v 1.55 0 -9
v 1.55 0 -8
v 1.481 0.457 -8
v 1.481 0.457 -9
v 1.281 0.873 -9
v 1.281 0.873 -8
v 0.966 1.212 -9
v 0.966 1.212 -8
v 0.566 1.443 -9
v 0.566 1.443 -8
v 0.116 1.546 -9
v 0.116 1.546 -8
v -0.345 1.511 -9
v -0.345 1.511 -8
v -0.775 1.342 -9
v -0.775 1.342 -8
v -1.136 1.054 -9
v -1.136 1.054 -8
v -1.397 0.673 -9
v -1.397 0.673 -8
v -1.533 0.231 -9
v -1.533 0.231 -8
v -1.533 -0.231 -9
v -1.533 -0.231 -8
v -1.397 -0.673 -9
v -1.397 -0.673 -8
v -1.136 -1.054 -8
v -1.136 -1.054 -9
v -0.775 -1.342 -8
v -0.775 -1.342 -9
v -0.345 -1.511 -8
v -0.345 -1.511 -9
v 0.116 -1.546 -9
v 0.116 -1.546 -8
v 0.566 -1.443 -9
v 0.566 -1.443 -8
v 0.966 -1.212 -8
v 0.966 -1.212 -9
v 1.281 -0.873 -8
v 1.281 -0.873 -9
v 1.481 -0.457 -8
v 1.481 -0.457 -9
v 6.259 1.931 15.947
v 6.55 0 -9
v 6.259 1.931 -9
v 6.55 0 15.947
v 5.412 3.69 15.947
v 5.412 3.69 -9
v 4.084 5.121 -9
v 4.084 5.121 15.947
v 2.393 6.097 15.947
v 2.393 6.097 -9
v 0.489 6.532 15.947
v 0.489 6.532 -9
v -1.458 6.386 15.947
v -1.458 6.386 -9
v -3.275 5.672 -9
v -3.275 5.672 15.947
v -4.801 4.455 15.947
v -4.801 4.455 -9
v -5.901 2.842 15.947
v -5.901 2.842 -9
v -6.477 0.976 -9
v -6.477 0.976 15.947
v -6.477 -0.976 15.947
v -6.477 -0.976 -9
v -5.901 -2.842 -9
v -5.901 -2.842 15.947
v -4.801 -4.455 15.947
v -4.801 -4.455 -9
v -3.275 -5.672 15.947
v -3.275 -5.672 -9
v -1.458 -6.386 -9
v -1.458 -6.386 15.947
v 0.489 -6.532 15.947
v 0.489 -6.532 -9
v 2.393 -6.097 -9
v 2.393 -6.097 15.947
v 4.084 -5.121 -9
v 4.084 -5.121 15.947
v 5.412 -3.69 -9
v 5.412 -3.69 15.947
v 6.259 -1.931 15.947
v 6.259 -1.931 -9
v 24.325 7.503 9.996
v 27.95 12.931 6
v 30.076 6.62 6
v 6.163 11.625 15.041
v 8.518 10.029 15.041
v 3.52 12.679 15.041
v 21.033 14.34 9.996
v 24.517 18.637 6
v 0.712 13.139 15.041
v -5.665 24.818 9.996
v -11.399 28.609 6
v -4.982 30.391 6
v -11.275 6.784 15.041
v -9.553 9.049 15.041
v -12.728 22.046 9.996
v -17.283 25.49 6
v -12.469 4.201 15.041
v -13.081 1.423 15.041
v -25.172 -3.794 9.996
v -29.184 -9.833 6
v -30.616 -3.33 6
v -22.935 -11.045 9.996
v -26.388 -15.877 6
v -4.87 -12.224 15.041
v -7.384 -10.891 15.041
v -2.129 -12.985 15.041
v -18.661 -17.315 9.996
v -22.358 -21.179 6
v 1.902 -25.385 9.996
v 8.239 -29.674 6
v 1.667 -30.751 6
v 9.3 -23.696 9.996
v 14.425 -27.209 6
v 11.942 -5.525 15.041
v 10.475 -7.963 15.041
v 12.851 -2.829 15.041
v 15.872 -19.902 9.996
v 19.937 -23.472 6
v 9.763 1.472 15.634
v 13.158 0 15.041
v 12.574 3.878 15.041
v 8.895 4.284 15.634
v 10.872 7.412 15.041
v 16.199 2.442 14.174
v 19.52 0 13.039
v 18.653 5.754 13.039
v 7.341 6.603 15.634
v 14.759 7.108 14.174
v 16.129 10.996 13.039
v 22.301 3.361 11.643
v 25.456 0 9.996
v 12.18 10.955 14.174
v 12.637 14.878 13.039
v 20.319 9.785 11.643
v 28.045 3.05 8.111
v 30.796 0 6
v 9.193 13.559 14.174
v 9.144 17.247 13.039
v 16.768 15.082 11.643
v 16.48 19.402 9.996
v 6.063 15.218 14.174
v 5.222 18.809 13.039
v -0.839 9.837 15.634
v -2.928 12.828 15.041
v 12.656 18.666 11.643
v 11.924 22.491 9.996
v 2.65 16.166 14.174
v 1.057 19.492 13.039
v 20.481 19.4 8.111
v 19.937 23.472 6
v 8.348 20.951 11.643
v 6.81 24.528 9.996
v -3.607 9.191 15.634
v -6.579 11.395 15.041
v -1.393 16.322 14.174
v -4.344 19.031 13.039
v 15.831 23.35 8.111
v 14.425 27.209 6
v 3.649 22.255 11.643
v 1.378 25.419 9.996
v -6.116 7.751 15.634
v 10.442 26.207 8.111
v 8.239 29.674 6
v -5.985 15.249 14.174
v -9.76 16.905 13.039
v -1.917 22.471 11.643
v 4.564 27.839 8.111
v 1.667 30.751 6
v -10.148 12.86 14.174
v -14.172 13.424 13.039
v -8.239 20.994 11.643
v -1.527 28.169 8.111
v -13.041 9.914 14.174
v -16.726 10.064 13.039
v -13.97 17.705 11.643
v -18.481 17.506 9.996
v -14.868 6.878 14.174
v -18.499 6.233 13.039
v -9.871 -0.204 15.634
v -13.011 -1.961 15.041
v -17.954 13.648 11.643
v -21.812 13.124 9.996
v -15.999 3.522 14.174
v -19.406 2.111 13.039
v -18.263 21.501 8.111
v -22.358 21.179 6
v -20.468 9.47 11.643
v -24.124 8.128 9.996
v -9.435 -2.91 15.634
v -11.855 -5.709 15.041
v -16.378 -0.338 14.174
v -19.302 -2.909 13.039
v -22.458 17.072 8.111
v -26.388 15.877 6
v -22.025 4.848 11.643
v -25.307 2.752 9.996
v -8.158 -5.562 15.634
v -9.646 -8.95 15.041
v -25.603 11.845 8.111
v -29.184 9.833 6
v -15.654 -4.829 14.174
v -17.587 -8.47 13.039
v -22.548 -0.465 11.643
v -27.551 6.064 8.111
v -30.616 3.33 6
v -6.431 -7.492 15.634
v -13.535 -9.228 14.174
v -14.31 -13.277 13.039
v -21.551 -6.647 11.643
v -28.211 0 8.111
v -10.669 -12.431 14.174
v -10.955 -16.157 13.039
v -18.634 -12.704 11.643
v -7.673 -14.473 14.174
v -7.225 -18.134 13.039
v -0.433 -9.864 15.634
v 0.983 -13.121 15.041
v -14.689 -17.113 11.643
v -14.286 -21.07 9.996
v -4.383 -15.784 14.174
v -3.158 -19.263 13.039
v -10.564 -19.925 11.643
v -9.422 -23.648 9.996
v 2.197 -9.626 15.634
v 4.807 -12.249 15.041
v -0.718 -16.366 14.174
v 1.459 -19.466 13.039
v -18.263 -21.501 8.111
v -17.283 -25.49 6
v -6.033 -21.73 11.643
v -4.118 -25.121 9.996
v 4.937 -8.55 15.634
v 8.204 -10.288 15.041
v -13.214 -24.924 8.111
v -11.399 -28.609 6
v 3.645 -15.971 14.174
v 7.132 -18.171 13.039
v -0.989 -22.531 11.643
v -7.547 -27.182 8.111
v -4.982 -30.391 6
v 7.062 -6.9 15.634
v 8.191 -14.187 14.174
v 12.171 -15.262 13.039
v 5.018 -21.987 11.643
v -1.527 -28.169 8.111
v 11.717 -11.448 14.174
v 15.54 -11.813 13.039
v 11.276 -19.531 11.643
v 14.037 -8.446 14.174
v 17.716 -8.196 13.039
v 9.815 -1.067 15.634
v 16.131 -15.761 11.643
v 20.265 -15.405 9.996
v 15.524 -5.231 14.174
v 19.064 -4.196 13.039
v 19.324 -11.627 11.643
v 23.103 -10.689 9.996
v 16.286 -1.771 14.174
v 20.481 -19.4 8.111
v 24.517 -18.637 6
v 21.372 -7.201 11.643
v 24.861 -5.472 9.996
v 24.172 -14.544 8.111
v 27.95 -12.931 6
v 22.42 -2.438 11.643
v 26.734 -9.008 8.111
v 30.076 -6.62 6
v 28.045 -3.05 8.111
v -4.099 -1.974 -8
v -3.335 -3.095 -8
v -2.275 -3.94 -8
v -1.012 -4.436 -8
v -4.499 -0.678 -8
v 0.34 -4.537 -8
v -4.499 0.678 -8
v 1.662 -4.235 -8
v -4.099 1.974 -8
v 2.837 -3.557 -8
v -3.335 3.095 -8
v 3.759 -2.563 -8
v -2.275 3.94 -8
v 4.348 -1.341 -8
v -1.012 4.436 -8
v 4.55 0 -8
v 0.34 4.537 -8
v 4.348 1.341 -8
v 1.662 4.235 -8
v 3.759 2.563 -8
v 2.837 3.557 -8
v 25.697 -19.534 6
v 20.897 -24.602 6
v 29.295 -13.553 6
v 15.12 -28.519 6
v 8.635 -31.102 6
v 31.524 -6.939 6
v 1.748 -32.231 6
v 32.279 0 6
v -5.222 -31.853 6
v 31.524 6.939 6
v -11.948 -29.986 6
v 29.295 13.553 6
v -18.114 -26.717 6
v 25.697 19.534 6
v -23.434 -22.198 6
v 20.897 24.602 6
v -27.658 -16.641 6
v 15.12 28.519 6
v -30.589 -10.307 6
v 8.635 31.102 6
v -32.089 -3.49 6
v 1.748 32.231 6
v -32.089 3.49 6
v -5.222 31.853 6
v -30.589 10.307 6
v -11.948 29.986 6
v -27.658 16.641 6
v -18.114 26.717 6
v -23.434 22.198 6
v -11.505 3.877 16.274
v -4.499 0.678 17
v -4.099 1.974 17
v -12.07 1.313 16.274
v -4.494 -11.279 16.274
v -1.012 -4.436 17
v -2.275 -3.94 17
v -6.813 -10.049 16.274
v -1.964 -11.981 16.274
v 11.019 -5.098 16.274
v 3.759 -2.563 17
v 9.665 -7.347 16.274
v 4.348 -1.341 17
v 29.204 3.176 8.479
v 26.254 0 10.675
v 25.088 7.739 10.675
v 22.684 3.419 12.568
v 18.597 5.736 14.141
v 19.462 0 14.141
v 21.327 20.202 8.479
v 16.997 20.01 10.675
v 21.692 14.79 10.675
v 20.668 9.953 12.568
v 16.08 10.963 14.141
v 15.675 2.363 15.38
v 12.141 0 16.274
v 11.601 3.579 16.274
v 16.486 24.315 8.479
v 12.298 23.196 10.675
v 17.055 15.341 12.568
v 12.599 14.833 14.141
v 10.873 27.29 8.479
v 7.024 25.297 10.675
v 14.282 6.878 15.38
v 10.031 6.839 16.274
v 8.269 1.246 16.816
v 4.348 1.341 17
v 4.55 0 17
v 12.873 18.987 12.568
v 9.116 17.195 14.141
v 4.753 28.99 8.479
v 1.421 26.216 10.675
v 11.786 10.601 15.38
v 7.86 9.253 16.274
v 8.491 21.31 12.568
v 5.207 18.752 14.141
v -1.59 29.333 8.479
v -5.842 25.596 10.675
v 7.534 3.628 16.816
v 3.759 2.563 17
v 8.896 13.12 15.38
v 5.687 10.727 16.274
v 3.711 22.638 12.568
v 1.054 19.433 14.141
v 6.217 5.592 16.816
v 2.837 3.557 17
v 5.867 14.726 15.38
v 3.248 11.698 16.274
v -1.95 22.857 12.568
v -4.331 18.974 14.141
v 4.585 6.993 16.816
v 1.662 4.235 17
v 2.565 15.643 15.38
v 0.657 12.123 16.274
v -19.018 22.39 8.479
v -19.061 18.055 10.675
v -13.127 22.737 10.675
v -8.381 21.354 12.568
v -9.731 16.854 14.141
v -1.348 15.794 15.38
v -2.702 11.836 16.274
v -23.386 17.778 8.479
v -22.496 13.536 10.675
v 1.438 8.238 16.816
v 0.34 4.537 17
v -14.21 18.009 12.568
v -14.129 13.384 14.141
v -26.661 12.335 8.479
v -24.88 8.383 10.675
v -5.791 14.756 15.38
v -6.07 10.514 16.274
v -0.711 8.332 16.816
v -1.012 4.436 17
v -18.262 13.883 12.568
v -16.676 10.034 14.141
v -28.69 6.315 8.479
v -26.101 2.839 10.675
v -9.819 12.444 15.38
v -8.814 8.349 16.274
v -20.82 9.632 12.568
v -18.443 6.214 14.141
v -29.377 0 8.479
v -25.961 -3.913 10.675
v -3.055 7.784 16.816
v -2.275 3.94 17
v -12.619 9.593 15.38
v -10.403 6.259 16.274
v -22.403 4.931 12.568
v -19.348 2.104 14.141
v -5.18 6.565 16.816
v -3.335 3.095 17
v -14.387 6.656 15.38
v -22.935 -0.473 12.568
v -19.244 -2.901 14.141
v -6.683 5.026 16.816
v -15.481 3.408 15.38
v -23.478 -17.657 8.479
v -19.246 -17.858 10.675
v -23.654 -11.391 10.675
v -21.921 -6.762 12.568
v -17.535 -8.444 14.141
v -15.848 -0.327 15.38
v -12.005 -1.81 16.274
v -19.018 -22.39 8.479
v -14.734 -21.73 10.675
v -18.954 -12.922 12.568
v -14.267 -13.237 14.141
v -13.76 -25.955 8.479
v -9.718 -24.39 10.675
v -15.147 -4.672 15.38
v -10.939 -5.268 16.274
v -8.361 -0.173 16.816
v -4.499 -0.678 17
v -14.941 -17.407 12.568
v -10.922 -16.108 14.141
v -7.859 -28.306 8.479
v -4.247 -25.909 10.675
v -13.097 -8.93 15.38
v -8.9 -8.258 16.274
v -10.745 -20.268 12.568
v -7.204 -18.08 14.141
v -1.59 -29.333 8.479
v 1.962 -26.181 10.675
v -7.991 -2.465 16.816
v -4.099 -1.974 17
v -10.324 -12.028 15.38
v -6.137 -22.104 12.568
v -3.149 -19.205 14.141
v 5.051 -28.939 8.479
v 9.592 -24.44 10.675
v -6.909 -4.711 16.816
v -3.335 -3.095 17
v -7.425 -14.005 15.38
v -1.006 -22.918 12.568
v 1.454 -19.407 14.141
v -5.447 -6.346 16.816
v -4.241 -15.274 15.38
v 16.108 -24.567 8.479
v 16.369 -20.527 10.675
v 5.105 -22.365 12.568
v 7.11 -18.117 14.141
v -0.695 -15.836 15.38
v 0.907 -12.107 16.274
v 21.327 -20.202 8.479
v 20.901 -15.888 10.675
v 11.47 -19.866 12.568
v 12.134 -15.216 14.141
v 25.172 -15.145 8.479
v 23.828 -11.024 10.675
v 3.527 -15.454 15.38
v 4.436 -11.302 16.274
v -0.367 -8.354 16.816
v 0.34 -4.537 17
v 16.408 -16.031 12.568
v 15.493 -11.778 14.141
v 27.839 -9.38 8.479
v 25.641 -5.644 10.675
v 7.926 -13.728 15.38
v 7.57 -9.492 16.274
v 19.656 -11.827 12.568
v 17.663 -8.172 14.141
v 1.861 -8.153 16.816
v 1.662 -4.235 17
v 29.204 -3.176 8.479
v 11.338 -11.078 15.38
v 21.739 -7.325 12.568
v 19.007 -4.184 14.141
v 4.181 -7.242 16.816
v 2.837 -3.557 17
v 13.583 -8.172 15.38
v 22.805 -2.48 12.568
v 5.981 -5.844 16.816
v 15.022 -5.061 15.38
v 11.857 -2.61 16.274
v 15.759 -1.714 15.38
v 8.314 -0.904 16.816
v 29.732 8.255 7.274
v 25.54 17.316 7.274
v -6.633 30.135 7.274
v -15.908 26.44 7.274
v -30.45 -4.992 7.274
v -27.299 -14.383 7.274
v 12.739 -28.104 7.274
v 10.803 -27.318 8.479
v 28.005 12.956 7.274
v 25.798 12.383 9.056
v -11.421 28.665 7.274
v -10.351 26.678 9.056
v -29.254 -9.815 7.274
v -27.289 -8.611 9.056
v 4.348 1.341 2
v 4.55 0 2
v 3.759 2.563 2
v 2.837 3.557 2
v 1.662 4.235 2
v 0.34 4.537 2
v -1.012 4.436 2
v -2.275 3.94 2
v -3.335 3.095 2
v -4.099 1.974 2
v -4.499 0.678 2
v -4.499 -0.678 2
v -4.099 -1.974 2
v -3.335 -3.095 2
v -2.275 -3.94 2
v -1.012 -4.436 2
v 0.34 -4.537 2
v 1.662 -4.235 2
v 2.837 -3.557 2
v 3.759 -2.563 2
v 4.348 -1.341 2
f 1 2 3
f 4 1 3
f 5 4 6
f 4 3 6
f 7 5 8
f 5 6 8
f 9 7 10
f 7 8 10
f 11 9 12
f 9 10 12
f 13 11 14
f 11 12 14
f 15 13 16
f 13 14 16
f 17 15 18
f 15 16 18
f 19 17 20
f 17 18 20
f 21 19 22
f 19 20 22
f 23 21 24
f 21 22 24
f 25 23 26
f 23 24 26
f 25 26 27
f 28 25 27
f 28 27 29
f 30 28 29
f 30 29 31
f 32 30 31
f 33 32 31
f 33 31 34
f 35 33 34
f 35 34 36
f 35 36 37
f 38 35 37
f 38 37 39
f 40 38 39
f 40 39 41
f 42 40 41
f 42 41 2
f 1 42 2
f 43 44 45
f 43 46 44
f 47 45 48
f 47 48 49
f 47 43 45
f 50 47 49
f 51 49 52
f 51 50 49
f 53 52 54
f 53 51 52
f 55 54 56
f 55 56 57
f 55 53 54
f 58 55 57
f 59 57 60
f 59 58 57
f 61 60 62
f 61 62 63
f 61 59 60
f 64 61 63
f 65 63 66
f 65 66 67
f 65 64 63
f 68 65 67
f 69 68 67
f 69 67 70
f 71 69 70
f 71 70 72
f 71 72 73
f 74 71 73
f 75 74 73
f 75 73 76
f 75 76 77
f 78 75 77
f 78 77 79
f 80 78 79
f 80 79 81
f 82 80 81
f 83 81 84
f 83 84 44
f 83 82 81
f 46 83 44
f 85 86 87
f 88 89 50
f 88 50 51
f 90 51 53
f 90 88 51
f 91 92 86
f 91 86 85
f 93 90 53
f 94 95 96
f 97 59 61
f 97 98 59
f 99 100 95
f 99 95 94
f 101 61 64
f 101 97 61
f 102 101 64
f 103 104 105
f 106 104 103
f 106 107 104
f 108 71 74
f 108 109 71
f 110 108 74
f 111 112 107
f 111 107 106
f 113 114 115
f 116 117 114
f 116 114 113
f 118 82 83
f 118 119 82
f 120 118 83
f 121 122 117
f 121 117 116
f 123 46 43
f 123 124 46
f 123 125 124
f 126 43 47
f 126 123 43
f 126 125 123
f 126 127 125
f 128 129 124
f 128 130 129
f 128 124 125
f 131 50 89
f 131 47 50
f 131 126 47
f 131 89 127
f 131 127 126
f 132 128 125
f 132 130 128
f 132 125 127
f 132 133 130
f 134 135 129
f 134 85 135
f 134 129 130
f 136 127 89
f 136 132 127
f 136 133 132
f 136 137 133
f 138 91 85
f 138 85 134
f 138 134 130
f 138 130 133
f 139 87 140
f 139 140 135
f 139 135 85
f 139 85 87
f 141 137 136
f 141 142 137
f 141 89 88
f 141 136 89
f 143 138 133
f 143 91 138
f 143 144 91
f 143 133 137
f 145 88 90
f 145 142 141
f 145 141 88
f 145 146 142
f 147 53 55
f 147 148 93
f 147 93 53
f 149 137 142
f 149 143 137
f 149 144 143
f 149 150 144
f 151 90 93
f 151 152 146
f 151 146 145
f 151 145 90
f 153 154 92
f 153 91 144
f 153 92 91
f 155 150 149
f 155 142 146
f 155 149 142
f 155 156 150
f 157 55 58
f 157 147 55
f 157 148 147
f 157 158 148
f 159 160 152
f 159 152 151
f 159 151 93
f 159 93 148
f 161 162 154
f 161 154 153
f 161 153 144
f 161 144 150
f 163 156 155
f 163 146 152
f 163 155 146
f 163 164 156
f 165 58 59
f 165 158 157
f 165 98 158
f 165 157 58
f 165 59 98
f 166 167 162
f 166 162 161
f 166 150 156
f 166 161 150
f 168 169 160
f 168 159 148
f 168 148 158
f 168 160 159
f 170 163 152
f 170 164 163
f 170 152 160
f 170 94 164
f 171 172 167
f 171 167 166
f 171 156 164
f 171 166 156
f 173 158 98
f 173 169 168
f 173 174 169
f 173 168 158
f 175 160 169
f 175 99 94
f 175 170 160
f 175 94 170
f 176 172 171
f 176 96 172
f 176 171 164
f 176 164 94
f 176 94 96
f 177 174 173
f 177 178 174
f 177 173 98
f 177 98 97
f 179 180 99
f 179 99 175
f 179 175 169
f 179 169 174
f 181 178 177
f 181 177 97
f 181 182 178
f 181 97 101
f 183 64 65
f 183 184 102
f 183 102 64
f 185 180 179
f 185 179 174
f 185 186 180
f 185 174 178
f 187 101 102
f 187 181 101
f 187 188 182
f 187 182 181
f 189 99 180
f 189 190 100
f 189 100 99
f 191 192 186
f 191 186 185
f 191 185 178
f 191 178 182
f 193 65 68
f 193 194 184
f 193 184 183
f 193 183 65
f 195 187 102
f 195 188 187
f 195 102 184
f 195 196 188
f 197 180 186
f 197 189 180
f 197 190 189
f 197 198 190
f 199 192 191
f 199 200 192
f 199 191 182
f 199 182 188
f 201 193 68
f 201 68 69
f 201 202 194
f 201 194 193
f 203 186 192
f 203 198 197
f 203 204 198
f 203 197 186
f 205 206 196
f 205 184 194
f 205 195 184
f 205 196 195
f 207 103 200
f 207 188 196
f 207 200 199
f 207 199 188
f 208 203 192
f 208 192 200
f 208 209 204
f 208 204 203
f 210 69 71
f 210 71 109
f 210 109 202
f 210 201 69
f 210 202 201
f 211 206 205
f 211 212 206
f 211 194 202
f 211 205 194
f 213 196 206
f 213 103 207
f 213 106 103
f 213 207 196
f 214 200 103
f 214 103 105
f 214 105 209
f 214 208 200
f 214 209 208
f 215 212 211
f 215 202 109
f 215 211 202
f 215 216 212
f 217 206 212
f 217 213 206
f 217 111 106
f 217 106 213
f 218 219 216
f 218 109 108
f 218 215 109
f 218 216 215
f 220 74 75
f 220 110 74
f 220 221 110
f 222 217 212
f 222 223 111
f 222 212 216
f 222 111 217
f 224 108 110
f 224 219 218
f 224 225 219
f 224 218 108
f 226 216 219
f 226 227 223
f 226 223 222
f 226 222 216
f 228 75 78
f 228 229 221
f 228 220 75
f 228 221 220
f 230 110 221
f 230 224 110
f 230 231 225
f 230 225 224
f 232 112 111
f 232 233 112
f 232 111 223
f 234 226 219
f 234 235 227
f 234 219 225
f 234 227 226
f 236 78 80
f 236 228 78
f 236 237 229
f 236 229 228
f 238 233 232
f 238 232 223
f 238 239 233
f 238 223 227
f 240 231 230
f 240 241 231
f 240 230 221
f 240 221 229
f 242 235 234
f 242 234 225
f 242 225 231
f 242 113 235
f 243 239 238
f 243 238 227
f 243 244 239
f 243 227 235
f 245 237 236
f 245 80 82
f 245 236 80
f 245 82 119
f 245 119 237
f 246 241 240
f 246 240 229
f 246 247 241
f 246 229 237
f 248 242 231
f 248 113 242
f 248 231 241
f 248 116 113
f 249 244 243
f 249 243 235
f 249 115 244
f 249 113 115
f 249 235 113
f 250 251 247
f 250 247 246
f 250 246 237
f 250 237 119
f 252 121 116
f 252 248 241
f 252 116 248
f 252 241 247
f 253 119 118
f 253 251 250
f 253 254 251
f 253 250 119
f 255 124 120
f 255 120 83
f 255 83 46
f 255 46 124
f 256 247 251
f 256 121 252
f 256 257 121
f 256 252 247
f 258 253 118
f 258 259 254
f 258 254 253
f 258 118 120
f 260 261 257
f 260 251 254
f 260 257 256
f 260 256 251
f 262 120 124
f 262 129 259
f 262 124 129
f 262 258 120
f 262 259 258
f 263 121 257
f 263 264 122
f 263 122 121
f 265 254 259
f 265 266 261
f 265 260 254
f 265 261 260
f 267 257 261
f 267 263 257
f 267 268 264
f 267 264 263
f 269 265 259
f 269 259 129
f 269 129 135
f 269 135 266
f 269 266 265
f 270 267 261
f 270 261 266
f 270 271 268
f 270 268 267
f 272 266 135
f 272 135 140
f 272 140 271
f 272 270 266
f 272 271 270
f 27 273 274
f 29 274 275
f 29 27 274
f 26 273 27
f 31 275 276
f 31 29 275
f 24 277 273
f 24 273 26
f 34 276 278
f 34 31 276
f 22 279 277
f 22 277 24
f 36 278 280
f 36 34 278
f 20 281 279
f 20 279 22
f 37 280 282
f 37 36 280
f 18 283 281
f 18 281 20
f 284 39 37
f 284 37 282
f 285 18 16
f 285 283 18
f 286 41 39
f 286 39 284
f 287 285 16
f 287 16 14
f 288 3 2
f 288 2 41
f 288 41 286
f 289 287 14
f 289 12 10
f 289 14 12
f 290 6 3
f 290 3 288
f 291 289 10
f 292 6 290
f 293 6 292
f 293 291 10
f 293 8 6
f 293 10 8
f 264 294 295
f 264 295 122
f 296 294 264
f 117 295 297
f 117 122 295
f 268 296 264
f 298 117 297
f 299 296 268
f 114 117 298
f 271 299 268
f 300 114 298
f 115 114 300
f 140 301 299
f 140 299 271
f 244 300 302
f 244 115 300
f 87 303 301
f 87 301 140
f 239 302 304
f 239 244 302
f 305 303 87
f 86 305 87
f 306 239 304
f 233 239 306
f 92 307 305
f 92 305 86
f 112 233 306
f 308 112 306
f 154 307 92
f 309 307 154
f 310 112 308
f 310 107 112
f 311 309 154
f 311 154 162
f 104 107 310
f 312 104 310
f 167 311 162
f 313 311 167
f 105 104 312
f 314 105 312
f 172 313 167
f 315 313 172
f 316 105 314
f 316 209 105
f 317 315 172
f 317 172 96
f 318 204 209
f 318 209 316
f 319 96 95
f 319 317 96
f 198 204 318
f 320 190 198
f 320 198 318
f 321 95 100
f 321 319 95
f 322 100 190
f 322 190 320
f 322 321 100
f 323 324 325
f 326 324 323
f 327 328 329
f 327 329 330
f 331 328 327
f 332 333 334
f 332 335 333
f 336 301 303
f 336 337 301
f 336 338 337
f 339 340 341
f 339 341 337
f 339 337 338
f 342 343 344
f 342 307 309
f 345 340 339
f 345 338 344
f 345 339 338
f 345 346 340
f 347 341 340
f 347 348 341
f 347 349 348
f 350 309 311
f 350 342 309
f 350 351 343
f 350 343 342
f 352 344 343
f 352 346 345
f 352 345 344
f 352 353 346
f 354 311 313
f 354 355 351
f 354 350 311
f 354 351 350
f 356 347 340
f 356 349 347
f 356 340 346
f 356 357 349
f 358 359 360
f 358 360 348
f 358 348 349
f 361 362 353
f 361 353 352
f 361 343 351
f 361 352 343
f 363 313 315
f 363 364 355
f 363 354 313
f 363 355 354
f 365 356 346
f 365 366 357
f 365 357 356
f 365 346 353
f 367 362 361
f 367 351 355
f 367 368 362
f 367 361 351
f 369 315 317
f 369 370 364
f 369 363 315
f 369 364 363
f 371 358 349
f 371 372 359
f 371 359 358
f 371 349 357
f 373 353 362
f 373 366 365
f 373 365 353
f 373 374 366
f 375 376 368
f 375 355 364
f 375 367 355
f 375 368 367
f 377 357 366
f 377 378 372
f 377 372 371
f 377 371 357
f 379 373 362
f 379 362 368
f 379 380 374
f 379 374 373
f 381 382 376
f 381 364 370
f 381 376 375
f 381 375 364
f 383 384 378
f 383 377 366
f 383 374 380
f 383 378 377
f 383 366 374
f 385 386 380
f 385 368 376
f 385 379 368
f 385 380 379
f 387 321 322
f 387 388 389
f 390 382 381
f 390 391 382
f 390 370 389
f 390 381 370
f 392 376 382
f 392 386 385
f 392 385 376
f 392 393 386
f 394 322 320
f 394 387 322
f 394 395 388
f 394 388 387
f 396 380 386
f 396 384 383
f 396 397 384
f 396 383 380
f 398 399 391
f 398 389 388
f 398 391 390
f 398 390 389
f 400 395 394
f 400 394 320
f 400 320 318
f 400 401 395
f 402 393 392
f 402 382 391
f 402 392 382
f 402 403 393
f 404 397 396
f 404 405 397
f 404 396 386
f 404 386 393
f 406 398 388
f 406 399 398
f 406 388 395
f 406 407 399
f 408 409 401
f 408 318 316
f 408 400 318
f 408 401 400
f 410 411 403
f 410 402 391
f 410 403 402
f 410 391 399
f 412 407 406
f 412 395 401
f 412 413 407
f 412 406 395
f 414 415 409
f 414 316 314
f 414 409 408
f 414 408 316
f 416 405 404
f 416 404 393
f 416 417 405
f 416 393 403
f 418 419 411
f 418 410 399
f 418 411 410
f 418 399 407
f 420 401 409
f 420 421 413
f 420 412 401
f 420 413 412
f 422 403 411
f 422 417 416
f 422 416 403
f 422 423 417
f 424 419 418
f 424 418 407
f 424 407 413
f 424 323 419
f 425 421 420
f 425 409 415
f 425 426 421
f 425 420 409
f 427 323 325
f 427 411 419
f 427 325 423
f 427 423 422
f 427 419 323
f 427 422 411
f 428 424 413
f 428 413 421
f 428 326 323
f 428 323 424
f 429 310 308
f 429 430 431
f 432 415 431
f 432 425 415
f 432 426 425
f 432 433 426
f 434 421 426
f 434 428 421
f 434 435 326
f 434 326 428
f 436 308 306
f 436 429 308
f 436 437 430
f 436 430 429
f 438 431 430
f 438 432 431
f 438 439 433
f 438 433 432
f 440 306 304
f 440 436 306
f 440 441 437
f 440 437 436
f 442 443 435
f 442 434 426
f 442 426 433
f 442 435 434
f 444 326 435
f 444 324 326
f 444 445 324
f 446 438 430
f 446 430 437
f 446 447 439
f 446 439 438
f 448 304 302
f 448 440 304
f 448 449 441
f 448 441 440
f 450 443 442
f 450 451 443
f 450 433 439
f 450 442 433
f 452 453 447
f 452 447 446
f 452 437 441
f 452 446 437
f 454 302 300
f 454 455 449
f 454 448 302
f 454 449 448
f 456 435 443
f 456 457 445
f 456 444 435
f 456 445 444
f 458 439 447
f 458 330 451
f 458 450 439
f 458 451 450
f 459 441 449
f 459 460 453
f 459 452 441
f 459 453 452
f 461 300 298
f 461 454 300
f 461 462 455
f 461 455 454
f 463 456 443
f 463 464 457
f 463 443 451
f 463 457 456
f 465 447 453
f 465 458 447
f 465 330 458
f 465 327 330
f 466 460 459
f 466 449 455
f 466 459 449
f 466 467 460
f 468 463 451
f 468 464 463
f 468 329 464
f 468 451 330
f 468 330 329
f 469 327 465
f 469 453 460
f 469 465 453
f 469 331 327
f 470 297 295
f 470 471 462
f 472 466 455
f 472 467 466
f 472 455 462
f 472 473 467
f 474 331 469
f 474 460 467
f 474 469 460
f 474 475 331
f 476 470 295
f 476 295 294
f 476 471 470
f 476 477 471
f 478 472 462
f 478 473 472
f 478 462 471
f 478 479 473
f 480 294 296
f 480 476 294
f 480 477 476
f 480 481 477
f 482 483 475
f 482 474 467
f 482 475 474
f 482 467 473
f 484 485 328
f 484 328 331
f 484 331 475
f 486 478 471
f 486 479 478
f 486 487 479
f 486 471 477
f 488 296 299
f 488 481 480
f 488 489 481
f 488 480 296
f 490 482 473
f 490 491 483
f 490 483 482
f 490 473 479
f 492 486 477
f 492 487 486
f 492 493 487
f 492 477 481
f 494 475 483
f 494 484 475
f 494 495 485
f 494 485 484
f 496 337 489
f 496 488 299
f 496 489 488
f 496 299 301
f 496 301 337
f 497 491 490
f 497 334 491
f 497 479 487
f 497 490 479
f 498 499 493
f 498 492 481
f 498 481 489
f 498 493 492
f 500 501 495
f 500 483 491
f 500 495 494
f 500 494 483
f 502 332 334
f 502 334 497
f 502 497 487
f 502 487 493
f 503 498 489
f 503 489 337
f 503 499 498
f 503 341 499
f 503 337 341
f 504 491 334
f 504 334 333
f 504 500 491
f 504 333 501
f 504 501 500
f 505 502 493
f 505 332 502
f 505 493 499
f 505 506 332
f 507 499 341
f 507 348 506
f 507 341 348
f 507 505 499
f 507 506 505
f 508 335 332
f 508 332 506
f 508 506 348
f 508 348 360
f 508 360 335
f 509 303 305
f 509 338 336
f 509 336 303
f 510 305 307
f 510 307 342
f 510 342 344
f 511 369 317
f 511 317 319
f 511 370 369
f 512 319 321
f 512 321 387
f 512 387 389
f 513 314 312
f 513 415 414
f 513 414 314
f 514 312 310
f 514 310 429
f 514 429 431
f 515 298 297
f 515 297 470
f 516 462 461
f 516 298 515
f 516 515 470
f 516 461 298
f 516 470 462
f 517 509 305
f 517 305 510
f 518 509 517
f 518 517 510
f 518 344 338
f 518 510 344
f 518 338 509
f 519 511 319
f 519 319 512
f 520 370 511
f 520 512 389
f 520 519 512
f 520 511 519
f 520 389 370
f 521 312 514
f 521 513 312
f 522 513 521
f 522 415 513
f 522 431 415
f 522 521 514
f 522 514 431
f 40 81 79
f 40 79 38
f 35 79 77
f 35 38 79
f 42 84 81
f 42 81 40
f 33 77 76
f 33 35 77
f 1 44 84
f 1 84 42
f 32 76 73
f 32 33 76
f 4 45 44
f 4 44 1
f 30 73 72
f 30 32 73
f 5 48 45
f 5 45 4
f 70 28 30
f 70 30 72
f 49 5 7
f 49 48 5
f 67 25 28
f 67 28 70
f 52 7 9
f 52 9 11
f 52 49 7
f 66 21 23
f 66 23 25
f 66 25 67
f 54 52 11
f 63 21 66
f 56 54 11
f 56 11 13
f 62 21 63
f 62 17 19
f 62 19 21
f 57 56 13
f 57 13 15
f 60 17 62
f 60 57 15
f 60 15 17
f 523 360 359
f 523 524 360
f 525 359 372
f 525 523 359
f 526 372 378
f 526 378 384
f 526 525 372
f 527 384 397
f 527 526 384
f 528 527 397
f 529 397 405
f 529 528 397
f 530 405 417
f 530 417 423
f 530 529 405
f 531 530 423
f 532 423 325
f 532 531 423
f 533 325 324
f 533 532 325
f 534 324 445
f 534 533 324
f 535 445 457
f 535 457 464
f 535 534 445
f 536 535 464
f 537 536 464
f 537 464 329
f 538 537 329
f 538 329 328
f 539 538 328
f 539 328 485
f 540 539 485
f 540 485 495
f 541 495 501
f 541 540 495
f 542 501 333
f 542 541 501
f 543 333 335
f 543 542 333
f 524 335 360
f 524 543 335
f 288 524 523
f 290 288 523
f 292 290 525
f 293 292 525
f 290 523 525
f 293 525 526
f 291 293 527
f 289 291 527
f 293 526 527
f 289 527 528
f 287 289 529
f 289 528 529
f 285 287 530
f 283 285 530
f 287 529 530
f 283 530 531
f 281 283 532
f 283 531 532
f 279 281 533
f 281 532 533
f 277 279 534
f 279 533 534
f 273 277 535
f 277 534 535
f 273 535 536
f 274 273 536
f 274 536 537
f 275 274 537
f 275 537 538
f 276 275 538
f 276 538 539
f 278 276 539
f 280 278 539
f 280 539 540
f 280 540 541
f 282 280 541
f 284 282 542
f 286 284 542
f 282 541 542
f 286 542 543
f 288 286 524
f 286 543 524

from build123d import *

# Parameters (mm, degrees)
F2_DEPTH = 10
F3_DEPTH = 10
F4_DEPTH = 1


with BuildPart() as f1:
    # F0 (on Front) → F1 (revolve)
    with BuildSketch(Plane.XZ):
        with BuildLine():
            Line((1.55, 2), (1.55, 0))
            Line((1.55, 0), (6.55, 0))
            Line((6.55, 0), (6.55, 14.9455200697))
            Line((6.55, 14.9455200697), (6.55, 15.9468985058))
            ThreePointArc((6.55, 15.9468985058), (19.5204691227, 13.0387576646), (30.7963834074, 6))
            Line((30.7963834074, 6), (32.2785816747, 6))
            ThreePointArc((32.2785816747, 6), (19.4618650437, 14.1407042674), (4.55, 17))
            Line((4.55, 17), (4.55, 16))
            Line((4.55, 16), (4.55, 15))
            Line((4.55, 15), (4.55, 2))
            Line((4.55, 2), (1.55, 2))
        make_face()
    revolve(axis=Axis((0, 0, 13.7464413419), (0, 0, 1)))

    # F2 (add): a face of the model
    f2_faces = [f1.faces().sort_by_distance(p)[0] for p in [
        (-1.7352619767, 0, 0),
    ]]
    extrude(f2_faces, amount=F2_DEPTH)

    # F3 (cut): a face of the model
    f3_faces = [f1.faces().sort_by_distance(p)[0] for p in [
        (-4.4213065658, 0, 2),
    ]]
    extrude(f3_faces, amount=-F3_DEPTH, mode=Mode.SUBTRACT)

    # F4 (cut): a face of the model
    f4_faces = [f1.faces().sort_by_distance(p)[0] for p in [
        (-1.7352619767, 0, -10),
    ]]
    extrude(f4_faces, amount=-F4_DEPTH, mode=Mode.SUBTRACT)


solid = f1.part
